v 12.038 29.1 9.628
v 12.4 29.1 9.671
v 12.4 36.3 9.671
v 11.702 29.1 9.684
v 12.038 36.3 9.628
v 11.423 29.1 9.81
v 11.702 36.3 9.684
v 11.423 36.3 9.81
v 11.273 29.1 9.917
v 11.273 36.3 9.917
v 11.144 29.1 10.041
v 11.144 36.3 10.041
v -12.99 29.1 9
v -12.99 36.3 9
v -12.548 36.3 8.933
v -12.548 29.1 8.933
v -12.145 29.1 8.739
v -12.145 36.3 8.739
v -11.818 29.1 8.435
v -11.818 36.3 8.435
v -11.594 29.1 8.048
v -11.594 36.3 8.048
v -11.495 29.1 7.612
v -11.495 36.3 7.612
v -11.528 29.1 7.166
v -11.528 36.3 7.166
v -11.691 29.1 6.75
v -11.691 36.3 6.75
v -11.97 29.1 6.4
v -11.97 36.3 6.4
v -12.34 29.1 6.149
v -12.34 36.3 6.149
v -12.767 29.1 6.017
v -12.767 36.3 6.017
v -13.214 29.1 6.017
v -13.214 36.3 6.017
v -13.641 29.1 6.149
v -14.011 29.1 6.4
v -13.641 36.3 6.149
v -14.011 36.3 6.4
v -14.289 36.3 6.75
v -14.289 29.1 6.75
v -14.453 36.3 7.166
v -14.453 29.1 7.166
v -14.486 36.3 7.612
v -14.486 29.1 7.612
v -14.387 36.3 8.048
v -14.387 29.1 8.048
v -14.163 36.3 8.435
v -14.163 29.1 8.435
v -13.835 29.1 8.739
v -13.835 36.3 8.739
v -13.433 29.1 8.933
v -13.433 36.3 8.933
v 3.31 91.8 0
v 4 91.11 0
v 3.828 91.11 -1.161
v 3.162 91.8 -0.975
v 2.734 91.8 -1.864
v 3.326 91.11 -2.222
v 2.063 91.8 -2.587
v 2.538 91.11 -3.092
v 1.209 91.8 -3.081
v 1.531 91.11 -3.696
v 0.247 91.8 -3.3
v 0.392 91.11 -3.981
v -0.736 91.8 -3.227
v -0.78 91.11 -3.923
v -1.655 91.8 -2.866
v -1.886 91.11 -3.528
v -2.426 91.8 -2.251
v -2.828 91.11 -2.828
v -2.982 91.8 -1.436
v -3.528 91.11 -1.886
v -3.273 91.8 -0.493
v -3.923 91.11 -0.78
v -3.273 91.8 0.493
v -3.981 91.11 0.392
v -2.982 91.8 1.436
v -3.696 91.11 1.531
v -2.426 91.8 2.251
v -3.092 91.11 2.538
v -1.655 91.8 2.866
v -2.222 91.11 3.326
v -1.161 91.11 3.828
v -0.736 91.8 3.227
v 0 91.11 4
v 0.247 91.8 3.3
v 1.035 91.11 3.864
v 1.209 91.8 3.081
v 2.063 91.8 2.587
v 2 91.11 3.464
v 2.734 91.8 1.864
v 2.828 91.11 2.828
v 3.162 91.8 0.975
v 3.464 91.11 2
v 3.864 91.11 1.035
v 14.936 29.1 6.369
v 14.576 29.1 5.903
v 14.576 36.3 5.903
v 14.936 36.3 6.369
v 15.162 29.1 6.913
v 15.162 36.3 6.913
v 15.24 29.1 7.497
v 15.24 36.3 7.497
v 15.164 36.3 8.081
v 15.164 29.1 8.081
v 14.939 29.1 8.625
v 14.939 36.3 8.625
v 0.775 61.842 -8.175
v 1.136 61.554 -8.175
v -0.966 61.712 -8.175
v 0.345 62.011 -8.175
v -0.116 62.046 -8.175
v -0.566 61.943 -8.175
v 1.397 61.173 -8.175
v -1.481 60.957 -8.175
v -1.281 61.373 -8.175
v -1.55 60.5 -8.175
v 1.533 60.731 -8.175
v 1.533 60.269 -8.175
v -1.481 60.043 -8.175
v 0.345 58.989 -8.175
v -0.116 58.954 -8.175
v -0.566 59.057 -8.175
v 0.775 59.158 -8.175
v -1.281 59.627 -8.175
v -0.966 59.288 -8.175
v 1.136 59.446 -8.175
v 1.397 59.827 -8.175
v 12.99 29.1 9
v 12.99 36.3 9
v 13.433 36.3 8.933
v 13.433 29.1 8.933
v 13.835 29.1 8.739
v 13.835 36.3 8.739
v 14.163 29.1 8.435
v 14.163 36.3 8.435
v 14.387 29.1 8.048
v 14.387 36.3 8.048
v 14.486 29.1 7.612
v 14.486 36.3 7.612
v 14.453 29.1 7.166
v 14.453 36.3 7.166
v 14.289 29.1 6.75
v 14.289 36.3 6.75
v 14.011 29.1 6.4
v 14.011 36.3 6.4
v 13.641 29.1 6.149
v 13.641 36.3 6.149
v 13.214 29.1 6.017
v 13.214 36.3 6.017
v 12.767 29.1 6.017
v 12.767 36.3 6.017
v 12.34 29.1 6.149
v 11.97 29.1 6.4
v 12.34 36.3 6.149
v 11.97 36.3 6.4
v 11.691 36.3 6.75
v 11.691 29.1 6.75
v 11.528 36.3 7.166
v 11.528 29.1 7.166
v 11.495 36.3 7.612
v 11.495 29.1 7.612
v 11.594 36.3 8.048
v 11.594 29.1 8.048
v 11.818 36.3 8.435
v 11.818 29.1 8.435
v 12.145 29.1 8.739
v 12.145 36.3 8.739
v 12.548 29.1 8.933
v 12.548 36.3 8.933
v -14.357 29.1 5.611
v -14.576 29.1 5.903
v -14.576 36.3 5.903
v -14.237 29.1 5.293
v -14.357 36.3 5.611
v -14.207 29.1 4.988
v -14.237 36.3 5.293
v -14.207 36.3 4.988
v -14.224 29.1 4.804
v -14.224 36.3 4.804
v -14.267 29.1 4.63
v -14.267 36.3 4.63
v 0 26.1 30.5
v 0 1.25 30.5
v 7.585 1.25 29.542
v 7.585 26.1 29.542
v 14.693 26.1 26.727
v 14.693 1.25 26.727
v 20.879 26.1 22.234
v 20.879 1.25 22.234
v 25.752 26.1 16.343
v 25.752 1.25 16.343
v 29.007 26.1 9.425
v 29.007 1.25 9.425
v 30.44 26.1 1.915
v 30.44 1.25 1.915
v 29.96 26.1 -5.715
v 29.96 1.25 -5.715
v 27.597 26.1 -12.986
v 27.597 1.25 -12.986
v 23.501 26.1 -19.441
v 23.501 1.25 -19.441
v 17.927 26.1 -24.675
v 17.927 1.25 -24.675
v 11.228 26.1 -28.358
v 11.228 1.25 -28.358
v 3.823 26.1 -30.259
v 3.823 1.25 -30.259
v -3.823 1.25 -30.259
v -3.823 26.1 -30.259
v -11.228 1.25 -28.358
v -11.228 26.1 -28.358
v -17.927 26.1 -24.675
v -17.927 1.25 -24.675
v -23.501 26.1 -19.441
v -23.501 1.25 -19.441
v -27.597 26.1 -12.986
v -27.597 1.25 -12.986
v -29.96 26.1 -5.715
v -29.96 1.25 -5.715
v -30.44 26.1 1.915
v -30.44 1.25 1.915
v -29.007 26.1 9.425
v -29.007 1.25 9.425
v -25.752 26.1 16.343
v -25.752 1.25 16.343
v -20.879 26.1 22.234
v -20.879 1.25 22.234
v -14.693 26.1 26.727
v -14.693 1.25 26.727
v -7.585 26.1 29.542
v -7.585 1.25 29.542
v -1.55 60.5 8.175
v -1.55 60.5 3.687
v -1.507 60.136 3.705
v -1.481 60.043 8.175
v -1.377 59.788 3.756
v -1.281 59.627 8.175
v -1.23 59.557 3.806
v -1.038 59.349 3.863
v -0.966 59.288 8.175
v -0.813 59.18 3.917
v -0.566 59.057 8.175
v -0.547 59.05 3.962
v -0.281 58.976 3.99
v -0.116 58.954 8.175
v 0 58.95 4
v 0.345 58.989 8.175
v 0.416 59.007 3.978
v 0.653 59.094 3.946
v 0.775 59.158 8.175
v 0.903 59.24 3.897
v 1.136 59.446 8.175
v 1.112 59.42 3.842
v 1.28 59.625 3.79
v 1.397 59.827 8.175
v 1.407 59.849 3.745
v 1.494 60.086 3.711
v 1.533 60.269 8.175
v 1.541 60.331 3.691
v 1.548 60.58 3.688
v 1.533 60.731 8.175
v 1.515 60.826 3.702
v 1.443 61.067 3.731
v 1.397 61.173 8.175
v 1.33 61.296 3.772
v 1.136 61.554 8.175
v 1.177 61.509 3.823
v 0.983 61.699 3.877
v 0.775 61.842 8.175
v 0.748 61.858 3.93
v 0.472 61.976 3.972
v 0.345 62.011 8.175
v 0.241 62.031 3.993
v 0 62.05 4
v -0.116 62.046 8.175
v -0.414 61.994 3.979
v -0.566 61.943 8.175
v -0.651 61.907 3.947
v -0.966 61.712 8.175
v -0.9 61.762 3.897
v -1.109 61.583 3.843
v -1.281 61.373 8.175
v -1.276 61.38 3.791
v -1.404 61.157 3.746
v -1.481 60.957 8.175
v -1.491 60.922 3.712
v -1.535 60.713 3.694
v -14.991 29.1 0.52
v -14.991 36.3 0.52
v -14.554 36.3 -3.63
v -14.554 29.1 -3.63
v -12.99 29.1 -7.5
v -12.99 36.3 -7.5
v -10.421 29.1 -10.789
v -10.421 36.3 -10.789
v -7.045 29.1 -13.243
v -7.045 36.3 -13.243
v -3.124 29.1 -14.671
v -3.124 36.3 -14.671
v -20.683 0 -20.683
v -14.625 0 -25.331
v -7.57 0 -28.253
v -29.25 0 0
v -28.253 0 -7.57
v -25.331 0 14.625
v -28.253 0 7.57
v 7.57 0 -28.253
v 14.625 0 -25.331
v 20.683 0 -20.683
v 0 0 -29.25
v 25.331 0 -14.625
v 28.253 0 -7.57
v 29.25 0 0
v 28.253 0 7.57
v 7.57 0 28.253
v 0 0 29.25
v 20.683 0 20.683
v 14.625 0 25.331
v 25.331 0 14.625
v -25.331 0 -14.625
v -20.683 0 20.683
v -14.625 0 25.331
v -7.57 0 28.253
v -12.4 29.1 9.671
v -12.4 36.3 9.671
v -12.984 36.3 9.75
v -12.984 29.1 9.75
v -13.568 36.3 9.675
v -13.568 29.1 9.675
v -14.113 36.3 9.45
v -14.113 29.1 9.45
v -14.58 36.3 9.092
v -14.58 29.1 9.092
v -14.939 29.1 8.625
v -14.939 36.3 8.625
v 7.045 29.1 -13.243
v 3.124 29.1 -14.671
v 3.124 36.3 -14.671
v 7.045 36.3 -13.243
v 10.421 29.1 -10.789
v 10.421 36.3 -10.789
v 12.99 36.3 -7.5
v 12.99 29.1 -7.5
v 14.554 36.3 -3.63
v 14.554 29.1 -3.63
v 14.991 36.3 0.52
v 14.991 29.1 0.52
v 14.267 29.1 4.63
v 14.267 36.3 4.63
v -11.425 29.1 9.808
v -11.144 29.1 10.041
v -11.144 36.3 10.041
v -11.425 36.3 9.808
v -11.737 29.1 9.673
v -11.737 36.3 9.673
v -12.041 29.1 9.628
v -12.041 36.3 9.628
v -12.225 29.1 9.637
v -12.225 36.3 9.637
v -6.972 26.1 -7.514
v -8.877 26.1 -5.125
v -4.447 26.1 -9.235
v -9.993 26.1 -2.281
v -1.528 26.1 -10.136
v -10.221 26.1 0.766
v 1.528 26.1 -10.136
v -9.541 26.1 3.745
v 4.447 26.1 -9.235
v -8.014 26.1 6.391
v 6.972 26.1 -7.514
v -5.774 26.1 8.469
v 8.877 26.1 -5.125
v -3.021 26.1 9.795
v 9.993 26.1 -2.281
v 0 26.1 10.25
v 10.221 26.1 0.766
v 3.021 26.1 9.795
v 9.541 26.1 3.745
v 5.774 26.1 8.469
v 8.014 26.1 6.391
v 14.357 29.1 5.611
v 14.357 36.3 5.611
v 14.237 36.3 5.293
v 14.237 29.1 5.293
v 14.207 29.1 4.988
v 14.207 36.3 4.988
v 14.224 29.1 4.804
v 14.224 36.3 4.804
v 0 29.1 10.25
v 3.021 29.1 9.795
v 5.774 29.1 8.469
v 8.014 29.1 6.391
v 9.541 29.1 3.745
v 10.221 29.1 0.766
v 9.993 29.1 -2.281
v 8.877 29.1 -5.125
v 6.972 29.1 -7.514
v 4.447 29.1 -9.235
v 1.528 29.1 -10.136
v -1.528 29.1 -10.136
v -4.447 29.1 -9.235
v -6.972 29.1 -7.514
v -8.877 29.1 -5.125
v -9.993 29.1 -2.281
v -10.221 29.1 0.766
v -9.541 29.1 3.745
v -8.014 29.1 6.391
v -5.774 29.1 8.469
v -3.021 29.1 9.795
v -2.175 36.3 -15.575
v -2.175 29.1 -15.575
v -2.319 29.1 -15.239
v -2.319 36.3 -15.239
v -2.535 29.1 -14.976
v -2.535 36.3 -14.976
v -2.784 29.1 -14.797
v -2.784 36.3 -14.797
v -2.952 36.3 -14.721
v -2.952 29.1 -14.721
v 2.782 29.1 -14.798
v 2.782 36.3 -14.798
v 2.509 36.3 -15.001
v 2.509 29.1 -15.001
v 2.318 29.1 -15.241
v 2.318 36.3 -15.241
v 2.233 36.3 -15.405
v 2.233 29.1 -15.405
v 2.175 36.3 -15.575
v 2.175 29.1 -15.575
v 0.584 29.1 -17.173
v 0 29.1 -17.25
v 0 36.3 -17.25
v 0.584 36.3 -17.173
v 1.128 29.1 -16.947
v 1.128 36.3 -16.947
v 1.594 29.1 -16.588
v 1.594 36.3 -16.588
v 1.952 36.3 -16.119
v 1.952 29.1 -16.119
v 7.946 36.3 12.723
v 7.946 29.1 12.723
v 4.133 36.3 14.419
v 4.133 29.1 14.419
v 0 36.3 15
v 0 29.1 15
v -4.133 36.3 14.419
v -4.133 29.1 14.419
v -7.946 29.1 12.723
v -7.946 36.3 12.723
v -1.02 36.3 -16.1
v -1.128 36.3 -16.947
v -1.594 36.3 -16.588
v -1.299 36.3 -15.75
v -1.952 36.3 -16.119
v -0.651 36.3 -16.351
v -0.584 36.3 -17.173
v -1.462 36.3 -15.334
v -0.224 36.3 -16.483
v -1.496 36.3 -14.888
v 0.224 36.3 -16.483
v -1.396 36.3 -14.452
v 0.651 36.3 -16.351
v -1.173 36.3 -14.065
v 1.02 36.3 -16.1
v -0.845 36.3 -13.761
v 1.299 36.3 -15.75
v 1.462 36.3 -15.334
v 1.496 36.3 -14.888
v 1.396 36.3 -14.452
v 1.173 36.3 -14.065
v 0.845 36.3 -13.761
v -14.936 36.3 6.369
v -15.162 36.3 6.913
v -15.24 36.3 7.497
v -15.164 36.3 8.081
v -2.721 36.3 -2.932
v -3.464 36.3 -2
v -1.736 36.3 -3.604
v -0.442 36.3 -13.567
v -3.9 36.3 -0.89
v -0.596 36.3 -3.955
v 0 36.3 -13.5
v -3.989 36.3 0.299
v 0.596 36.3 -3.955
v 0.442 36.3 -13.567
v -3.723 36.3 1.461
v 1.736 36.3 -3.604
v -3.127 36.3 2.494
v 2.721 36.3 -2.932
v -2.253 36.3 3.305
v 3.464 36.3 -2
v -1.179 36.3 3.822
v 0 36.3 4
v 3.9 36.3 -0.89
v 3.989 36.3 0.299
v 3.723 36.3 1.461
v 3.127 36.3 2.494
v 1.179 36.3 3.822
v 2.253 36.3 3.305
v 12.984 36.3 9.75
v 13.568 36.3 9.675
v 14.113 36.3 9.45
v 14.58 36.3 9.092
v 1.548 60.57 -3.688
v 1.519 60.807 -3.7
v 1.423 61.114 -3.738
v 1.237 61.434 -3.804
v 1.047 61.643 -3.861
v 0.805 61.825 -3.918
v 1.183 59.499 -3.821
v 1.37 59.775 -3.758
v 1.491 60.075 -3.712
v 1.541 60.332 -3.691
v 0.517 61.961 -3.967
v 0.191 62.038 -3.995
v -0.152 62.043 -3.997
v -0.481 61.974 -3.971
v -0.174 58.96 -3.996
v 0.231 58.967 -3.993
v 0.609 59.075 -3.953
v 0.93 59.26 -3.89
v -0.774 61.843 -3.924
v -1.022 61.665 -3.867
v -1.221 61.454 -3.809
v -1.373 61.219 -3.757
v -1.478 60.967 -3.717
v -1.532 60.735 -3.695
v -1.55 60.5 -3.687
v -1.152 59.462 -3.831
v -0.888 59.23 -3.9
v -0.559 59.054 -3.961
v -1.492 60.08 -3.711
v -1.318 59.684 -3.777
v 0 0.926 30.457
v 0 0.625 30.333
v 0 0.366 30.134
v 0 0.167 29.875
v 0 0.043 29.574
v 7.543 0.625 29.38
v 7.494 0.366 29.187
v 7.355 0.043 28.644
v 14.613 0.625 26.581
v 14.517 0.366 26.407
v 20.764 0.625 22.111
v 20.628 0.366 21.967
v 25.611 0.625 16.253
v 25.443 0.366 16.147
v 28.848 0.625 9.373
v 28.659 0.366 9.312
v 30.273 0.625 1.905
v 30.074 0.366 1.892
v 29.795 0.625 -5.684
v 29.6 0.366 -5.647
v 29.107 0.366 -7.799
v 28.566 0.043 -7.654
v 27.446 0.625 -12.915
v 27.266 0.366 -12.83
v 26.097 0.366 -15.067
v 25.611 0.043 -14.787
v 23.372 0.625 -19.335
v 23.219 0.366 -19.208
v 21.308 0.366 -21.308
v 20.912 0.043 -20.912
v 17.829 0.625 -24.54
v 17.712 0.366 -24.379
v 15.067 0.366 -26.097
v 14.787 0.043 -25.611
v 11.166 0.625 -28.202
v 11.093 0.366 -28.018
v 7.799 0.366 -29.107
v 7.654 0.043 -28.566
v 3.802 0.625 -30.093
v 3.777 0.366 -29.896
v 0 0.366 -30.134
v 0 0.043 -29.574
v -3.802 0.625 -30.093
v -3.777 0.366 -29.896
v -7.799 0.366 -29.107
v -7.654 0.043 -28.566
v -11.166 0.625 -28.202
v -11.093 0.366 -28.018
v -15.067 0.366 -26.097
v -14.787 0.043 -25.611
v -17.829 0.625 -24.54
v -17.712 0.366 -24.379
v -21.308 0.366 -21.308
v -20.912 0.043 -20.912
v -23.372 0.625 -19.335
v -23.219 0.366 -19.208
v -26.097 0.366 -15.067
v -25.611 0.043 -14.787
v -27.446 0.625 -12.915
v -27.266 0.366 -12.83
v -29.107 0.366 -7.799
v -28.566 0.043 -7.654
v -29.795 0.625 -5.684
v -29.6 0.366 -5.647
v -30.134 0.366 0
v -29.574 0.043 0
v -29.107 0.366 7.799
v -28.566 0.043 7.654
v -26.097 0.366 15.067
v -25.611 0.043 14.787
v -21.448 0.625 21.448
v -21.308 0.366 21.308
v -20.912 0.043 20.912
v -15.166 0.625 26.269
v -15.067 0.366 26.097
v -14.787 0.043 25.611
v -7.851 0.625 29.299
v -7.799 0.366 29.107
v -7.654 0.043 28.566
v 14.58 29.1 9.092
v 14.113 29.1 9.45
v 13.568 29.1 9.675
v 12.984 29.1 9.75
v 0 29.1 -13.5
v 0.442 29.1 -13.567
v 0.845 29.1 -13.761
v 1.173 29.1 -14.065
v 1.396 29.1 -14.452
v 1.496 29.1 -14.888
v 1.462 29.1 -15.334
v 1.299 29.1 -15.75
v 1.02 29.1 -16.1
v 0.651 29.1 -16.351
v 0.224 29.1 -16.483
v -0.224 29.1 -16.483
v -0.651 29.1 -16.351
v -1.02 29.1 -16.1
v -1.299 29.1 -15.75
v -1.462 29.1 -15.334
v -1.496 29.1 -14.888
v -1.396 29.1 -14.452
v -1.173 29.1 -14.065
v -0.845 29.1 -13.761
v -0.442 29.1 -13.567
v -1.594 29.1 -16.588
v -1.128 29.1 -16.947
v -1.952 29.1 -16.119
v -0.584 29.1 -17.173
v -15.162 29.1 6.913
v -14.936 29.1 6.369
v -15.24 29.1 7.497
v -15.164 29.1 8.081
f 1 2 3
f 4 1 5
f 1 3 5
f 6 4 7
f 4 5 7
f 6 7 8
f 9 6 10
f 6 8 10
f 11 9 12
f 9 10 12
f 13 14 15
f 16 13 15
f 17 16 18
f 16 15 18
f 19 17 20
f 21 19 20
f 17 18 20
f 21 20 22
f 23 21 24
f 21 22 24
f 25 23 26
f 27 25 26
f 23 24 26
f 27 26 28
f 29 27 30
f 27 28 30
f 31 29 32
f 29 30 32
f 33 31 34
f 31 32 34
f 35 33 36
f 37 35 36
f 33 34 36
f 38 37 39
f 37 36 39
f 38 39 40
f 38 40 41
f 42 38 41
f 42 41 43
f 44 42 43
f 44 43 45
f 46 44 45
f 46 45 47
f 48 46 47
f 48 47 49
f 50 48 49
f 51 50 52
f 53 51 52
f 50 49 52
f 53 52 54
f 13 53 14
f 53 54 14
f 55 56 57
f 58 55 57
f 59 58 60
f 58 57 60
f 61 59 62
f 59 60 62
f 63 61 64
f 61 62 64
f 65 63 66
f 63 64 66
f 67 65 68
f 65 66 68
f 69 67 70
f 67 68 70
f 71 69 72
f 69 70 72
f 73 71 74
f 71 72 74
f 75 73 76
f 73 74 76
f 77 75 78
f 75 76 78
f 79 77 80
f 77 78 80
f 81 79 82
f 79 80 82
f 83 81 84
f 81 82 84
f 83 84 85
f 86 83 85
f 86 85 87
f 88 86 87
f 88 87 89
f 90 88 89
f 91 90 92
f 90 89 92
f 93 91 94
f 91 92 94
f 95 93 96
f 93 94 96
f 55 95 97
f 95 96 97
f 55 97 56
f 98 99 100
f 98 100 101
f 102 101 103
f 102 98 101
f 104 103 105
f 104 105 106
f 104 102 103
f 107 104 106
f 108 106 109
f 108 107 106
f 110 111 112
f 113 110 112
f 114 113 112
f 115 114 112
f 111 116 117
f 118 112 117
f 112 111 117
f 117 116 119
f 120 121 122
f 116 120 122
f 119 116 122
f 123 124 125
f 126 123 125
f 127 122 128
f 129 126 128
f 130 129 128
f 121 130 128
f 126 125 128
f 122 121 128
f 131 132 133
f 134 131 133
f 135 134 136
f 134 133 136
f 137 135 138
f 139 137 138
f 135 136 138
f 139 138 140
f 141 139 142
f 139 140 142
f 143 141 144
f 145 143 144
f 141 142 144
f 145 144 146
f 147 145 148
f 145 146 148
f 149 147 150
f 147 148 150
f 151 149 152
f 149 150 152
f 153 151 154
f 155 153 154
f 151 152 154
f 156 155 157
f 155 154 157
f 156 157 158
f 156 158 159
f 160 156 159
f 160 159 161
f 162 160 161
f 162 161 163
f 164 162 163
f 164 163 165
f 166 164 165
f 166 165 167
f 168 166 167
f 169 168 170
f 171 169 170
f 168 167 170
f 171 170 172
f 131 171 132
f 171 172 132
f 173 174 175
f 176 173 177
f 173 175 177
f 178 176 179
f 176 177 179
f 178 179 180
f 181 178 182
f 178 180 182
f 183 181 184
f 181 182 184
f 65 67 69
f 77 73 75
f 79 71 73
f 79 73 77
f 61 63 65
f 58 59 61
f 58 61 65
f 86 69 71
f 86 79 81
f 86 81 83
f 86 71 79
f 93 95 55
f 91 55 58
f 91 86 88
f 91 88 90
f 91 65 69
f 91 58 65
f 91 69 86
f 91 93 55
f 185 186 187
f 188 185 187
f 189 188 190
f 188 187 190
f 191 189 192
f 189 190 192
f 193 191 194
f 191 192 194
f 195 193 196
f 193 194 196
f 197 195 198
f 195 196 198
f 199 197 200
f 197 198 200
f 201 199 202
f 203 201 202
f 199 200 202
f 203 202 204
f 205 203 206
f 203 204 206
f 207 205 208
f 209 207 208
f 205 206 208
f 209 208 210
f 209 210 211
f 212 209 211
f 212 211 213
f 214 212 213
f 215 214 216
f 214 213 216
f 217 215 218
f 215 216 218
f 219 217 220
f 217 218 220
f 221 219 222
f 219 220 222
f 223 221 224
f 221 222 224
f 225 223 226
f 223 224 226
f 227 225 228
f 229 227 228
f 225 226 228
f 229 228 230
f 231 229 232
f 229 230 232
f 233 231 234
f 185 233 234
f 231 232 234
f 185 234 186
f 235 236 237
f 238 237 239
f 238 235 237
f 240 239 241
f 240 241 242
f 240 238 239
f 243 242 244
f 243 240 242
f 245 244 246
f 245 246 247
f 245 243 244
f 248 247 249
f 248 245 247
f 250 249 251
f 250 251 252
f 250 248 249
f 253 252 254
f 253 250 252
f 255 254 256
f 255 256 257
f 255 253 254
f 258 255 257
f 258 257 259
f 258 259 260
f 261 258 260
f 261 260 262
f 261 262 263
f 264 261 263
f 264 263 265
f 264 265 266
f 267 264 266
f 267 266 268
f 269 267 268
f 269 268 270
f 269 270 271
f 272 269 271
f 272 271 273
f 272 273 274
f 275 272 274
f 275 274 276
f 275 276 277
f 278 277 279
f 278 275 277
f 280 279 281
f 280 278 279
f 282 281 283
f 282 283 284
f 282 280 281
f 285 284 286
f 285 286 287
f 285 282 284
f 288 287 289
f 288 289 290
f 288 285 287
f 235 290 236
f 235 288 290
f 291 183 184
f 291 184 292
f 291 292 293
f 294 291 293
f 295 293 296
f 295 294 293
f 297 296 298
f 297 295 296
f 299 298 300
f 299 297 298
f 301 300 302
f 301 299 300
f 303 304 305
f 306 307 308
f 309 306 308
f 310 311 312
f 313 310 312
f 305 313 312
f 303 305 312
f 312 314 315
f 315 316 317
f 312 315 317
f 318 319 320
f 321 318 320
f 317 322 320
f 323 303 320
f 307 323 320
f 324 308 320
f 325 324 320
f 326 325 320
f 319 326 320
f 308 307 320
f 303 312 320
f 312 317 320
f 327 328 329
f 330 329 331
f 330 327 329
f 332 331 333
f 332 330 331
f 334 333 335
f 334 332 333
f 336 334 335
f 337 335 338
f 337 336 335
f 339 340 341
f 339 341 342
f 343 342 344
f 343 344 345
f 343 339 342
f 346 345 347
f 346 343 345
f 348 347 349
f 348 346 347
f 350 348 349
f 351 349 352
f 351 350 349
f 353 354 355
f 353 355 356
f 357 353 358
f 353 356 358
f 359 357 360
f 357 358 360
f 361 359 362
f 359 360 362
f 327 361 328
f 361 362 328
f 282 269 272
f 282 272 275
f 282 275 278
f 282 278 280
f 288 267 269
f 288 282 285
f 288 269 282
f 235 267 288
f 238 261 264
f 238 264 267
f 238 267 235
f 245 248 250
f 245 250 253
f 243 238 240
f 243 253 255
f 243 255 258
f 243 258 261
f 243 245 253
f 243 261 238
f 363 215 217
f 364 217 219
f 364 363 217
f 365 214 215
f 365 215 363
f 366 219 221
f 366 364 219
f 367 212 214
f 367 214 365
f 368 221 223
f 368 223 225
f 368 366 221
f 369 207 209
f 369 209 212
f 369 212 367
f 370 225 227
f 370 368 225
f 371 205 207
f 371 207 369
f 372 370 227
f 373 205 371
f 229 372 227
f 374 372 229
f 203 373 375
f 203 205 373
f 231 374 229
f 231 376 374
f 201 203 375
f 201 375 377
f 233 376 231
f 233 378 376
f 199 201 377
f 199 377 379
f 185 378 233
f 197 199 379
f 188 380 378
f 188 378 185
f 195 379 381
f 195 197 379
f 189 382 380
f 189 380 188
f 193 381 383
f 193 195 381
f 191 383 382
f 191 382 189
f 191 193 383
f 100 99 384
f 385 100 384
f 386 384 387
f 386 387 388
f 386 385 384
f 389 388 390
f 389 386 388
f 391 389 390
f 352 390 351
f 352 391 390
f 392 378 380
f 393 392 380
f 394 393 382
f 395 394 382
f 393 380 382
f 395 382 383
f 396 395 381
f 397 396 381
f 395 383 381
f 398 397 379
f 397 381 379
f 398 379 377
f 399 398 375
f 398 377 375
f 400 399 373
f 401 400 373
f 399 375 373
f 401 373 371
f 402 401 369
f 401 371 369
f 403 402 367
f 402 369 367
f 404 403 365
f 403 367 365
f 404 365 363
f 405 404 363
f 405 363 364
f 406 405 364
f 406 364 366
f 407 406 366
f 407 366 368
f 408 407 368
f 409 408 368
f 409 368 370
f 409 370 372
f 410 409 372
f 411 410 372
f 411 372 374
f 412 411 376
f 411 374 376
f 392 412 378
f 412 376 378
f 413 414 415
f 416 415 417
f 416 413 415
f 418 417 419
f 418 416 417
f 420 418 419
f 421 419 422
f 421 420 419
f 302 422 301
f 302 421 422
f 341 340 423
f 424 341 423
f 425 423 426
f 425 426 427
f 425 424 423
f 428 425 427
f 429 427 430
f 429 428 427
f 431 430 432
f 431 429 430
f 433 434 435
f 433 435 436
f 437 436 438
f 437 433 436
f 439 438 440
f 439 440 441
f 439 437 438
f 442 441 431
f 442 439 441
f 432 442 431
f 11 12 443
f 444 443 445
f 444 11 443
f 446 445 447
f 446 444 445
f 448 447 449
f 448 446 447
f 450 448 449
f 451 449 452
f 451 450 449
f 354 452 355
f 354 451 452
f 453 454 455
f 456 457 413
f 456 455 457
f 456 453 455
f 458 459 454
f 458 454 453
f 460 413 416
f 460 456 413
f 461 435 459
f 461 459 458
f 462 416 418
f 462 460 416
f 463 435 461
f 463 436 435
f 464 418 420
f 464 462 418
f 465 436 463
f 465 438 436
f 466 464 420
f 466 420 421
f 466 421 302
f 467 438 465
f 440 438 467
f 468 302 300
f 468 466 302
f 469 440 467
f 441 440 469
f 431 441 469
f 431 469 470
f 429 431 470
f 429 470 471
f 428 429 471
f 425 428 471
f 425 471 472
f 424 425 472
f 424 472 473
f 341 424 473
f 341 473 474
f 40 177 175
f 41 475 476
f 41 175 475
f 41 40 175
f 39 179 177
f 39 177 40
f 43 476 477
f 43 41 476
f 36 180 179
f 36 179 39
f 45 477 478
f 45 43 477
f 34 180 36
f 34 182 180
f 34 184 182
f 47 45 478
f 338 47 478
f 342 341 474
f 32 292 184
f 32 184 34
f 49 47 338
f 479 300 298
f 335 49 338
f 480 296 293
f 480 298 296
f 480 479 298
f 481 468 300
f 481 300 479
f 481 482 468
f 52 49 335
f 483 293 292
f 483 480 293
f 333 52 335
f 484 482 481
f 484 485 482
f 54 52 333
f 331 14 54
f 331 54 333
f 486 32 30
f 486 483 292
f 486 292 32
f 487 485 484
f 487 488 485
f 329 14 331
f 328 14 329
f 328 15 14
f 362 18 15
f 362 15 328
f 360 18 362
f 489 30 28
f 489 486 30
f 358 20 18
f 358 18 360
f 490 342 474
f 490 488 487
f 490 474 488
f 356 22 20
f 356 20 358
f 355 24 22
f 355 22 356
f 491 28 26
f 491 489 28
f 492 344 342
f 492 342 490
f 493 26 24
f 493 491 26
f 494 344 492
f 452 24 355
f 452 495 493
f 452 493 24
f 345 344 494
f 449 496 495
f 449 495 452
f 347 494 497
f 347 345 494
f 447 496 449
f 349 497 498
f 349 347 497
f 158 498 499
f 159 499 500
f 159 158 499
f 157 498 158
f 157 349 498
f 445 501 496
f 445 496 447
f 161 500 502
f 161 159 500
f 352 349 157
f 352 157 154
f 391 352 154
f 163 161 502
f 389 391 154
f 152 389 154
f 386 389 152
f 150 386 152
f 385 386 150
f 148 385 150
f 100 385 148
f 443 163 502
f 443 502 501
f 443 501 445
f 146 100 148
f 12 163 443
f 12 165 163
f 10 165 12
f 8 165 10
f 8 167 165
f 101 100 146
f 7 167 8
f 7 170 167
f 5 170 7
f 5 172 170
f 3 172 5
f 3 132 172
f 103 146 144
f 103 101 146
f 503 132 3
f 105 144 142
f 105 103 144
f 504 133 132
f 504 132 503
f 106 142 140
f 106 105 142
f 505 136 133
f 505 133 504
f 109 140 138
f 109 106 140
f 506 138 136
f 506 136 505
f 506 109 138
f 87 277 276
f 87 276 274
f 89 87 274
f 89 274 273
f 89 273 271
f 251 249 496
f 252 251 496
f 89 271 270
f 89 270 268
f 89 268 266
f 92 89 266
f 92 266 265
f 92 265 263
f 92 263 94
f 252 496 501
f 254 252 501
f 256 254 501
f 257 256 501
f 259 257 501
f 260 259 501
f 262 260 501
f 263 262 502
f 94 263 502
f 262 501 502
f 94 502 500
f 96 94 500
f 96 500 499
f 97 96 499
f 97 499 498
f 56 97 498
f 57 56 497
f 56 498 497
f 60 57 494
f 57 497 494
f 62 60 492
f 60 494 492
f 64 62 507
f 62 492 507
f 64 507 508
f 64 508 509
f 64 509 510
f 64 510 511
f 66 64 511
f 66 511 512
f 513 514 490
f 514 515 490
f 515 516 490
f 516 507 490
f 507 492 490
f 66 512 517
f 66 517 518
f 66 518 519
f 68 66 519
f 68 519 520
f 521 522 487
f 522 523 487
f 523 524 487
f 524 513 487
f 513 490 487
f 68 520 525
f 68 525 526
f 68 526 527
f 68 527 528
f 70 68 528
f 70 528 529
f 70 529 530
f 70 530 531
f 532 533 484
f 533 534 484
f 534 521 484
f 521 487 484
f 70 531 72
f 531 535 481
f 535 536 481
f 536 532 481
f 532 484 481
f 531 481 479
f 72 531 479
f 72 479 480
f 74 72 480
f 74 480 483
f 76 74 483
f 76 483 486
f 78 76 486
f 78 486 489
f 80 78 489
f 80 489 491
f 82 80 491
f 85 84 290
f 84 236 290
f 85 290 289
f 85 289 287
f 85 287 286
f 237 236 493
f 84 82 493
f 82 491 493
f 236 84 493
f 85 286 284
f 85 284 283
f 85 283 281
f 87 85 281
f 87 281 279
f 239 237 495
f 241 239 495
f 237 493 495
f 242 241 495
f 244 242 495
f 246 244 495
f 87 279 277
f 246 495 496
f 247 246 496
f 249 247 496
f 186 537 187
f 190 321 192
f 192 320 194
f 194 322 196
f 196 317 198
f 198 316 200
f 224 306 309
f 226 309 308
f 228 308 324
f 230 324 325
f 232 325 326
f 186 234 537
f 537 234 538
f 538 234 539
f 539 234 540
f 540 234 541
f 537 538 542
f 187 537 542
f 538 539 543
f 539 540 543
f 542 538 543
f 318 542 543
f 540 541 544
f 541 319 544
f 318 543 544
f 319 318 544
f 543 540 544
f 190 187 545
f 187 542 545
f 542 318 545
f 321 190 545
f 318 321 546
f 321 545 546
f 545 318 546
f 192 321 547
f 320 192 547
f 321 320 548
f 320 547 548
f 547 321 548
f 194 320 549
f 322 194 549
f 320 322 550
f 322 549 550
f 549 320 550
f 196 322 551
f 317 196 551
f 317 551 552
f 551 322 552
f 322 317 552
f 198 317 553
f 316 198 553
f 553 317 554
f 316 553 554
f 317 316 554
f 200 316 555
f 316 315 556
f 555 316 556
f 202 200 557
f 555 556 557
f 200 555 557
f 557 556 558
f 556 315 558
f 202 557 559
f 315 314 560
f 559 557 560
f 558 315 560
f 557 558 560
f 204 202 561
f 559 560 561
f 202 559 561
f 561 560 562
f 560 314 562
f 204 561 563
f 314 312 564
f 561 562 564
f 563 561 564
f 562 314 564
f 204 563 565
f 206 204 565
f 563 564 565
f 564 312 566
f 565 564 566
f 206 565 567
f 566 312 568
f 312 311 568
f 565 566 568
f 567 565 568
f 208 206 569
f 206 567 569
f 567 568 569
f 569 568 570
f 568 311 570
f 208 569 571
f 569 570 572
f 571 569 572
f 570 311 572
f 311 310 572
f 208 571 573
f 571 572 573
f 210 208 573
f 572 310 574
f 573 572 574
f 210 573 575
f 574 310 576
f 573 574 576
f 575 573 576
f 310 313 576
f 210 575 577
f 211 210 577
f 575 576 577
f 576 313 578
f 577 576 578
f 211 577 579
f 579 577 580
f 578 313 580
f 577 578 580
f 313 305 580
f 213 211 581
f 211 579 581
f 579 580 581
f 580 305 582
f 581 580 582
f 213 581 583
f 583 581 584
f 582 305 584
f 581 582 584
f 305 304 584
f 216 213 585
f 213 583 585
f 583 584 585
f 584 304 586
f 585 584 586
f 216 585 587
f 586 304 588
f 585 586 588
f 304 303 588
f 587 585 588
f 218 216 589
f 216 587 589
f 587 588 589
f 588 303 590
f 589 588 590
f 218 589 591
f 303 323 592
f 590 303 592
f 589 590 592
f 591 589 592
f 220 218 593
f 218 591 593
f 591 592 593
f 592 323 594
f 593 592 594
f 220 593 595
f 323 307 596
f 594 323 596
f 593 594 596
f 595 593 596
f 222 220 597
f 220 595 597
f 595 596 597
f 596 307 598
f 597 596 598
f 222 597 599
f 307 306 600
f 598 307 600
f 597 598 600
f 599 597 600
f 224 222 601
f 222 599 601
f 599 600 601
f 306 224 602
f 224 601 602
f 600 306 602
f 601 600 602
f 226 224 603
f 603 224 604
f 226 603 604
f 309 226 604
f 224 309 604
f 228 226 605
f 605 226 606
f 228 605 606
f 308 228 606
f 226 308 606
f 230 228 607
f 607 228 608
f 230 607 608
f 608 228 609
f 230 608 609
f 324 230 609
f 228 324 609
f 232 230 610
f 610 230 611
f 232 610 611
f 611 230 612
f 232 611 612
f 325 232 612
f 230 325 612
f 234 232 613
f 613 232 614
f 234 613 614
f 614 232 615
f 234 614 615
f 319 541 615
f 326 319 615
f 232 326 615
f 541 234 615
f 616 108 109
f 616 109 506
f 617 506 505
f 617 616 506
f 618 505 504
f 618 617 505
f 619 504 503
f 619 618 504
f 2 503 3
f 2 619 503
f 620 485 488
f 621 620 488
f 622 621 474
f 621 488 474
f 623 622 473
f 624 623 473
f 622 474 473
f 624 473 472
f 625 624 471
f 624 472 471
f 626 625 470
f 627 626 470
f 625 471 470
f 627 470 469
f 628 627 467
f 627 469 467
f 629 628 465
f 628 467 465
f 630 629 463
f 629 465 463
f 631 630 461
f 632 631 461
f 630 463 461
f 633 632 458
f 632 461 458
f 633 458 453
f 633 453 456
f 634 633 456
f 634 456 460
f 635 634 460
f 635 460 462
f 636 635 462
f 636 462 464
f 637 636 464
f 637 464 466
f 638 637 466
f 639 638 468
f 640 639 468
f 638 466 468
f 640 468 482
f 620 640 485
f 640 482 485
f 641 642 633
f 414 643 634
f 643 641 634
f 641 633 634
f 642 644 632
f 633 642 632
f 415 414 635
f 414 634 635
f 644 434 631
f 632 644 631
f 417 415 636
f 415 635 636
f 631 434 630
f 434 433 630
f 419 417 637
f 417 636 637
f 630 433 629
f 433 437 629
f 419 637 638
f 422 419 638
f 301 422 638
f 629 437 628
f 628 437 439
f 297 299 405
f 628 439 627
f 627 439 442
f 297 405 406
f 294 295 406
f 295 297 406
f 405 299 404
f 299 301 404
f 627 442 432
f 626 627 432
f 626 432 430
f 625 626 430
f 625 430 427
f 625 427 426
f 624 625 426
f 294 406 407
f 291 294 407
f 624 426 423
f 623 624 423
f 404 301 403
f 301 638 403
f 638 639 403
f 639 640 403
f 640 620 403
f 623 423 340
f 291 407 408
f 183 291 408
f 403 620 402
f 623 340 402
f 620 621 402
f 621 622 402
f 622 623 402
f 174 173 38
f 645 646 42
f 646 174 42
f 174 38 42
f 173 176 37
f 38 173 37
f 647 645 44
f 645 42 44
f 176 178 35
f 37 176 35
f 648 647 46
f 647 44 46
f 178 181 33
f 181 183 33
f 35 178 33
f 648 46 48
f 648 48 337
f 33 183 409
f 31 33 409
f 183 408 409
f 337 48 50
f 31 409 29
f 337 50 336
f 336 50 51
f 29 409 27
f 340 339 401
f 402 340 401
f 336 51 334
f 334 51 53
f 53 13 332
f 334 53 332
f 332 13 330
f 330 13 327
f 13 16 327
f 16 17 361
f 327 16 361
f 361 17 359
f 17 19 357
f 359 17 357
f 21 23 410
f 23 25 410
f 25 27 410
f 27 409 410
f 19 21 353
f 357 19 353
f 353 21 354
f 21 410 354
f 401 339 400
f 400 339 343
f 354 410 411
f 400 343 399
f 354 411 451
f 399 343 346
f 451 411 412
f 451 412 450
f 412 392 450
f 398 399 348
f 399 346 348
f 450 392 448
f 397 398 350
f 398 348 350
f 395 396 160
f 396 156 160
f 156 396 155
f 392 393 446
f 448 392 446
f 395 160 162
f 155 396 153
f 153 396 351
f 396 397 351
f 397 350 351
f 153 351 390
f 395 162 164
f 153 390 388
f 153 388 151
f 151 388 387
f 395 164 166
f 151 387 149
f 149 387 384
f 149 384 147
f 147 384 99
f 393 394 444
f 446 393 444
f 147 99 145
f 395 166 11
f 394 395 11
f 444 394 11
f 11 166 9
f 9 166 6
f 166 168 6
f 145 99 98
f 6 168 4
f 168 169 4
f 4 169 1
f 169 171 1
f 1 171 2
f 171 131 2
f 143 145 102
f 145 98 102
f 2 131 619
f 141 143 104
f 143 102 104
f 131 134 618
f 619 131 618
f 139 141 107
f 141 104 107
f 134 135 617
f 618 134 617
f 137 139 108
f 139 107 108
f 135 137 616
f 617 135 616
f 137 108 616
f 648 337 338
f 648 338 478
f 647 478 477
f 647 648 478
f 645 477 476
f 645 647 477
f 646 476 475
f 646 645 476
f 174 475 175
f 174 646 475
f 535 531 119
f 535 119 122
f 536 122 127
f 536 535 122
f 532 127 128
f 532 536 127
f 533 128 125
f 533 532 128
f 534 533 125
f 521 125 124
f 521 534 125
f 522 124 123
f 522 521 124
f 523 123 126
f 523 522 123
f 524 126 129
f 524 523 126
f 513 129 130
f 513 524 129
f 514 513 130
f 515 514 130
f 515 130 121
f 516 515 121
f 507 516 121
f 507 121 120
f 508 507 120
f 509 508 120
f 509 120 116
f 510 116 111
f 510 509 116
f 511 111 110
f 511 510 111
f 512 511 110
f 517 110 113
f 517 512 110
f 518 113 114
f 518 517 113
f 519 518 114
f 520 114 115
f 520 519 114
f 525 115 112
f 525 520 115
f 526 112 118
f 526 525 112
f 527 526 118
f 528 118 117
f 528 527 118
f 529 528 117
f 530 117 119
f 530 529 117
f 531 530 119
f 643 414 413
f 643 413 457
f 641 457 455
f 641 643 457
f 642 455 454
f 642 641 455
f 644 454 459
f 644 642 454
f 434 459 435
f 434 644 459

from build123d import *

# Parameters (mm, degrees)
SKETCH1_R           = 30.5
BOSS_EXTRUDE1_DEPTH = 26.1
SKETCH2_R           = 10.25
BOSS_EXTRUDE2_DEPTH = 3
SKETCH3_R           = 17.25
BOSS_EXTRUDE3_DEPTH = 7.2
CUT_EXTRUDE1_START  = -10.2
CUT_EXTRUDE1_DEPTH  = 10.2
SKETCH4_4_R         = 1.5
CUT_EXTRUDE2_DEPTH  = 7.2
SKETCH7_R           = 4
BOSS_EXTRUDE4_DEPTH = 55.5
FILLET1_R           = 1.25
SKETCH8_R           = 1.55
BOSS_EXTRUDE5_DEPTH = 8.175


# Read off the part's stored shape, not the designer's step: M8x1.25 Machine Threads Stud1
with BuildPart() as part:
    # Sketch1 → Boss-Extrude1 (new body)
    with BuildSketch(Plane(origin=(0, 0, 0), x_dir=(1, 0, 0), z_dir=(0, 1, 0))):
        with Locations(Location((0, 0, 0), (0, 0, 270))):
            Circle(SKETCH1_R)
    extrude(amount=BOSS_EXTRUDE1_DEPTH)

    # Sketch2 → Boss-Extrude2 (add)
    with BuildSketch(Plane(origin=(0, 26.1, 0), x_dir=(1, 0, 0), z_dir=(0, 1, 0))):
        with Locations(Location((0, 0, 0), (0, 0, 270))):
            Circle(SKETCH2_R)
    extrude(amount=BOSS_EXTRUDE2_DEPTH)

    # Sketch3 → Boss-Extrude3 (add)
    with BuildSketch(Plane(origin=(0, 29.1, 0), x_dir=(1, 0, 0), z_dir=(0, 1, 0))):
        with Locations(Location((0, 0, 0), (0, 0, 270))):
            Circle(SKETCH3_R)
    extrude(amount=BOSS_EXTRUDE3_DEPTH)

    # Sketch4 → Cut-Extrude1 (cut)
    with BuildSketch(Plane(origin=(0, 36.3, 0), x_dir=(1, 0, 0), z_dir=(0, 1, 0)).offset(CUT_EXTRUDE1_START)):
        with BuildLine():
            ThreePointArc((-13.966070745, -5.472555887), (-12.990381057, 7.5), (-2.243662951, 14.83125))
            ThreePointArc((-2.243662951, 14.83125), (-1.649573809, 16.530165432), (0, 17.25))
            ThreePointArc((0, 17.25), (-14.938938189, 8.625000045), (-14.938938267, -8.62499991))
            ThreePointArc((-14.938938267, -8.62499991), (-15.140330082, -6.836509843), (-13.966070745, -5.472555887))
        make_face()
        with BuildLine():
            ThreePointArc((2.243662951, 14.83125), (12.990381057, 7.5), (13.966070745, -5.472555887))
            ThreePointArc((13.966070745, -5.472555887), (15.140330099, -6.836509898), (14.938938209, -8.62500001))
            ThreePointArc((14.938938209, -8.62500001), (14.938938218, 8.624999995), (0, 17.25))
            ThreePointArc((0, 17.25), (1.649573809, 16.530165432), (2.243662951, 14.83125))
        make_face()
        with BuildLine():
            ThreePointArc((11.722407794, -9.358694113), (0, -15), (-11.722407794, -9.358694113))
            ThreePointArc((-11.722407794, -9.358694113), (-13.49075634, -9.693655528), (-14.938938267, -8.62499991))
            ThreePointArc((-14.938938267, -8.62499991), (-5.8e-08, -17.25), (14.938938209, -8.62500001))
            ThreePointArc((14.938938209, -8.62500001), (13.490756283, -9.693655541), (11.722407794, -9.358694113))
        make_face()
    extrude(amount=CUT_EXTRUDE1_DEPTH, mode=Mode.SUBTRACT)

    # Sketch4<4> → Cut-Extrude2 (cut)
    with BuildSketch(Plane(origin=(0, 36.3, 0), x_dir=(1, 0, 0), z_dir=(0, 1, 0))):
        with Locations(Location((0, 15, 0), (0, 0, 270))):
            Circle(SKETCH4_4_R)
        with Locations(Location((12.990381057, -7.5, 0), (0, 0, 270))):
            Circle(SKETCH4_4_R)
        with Locations(Location((-12.990381057, -7.5, 0), (0, 0, 270))):
            Circle(SKETCH4_4_R)
    extrude(amount=-CUT_EXTRUDE2_DEPTH, mode=Mode.SUBTRACT)

    # Sketch7 → Boss-Extrude4 (add)
    with BuildSketch(Plane(origin=(0, 36.3, 0), x_dir=(1, 0, 0), z_dir=(0, 1, 0))):
        with Locations(Location((0, 0, 0), (0, 0, 270))):
            Circle(SKETCH7_R)
    extrude(amount=BOSS_EXTRUDE4_DEPTH)

    # Fillet1
    fillet1_edges = [part.edges().sort_by_distance(p)[0] for p in [
        (0, 0, -30.5),
        (-13.966070745, 32.7, 5.472555887),
        (-2.243662951, 32.7, -14.83125),
        (13.966070745, 32.7, 5.472555887),
        (2.243662951, 32.7, -14.83125),
        (-11.722407794, 32.7, 9.358694113),
        (11.722407794, 32.7, 9.358694113),
    ]]
    fillet(fillet1_edges, radius=FILLET1_R)

    # Sketch8 → Boss-Extrude5 (add, symmetric)
    with BuildSketch(Plane.XY):
        with Locations(Location((0, 60.5, 0), (0, 0, 180))):
            Circle(SKETCH8_R)
    extrude(amount=BOSS_EXTRUDE5_DEPTH, both=True)

    # M8x1.25 Machine Threads Stud1 outline → M8x1.25 Machine Threads Stud1 (revolve, cut)
    with BuildSketch(Plane.XY):
        Polygon((4, 91.8), (3.3095, 91.8), (4, 91.1095), align=None)
    revolve(axis=Axis((0, 0, 0), (0, 1, 0)), mode=Mode.SUBTRACT)


solid = part.part
